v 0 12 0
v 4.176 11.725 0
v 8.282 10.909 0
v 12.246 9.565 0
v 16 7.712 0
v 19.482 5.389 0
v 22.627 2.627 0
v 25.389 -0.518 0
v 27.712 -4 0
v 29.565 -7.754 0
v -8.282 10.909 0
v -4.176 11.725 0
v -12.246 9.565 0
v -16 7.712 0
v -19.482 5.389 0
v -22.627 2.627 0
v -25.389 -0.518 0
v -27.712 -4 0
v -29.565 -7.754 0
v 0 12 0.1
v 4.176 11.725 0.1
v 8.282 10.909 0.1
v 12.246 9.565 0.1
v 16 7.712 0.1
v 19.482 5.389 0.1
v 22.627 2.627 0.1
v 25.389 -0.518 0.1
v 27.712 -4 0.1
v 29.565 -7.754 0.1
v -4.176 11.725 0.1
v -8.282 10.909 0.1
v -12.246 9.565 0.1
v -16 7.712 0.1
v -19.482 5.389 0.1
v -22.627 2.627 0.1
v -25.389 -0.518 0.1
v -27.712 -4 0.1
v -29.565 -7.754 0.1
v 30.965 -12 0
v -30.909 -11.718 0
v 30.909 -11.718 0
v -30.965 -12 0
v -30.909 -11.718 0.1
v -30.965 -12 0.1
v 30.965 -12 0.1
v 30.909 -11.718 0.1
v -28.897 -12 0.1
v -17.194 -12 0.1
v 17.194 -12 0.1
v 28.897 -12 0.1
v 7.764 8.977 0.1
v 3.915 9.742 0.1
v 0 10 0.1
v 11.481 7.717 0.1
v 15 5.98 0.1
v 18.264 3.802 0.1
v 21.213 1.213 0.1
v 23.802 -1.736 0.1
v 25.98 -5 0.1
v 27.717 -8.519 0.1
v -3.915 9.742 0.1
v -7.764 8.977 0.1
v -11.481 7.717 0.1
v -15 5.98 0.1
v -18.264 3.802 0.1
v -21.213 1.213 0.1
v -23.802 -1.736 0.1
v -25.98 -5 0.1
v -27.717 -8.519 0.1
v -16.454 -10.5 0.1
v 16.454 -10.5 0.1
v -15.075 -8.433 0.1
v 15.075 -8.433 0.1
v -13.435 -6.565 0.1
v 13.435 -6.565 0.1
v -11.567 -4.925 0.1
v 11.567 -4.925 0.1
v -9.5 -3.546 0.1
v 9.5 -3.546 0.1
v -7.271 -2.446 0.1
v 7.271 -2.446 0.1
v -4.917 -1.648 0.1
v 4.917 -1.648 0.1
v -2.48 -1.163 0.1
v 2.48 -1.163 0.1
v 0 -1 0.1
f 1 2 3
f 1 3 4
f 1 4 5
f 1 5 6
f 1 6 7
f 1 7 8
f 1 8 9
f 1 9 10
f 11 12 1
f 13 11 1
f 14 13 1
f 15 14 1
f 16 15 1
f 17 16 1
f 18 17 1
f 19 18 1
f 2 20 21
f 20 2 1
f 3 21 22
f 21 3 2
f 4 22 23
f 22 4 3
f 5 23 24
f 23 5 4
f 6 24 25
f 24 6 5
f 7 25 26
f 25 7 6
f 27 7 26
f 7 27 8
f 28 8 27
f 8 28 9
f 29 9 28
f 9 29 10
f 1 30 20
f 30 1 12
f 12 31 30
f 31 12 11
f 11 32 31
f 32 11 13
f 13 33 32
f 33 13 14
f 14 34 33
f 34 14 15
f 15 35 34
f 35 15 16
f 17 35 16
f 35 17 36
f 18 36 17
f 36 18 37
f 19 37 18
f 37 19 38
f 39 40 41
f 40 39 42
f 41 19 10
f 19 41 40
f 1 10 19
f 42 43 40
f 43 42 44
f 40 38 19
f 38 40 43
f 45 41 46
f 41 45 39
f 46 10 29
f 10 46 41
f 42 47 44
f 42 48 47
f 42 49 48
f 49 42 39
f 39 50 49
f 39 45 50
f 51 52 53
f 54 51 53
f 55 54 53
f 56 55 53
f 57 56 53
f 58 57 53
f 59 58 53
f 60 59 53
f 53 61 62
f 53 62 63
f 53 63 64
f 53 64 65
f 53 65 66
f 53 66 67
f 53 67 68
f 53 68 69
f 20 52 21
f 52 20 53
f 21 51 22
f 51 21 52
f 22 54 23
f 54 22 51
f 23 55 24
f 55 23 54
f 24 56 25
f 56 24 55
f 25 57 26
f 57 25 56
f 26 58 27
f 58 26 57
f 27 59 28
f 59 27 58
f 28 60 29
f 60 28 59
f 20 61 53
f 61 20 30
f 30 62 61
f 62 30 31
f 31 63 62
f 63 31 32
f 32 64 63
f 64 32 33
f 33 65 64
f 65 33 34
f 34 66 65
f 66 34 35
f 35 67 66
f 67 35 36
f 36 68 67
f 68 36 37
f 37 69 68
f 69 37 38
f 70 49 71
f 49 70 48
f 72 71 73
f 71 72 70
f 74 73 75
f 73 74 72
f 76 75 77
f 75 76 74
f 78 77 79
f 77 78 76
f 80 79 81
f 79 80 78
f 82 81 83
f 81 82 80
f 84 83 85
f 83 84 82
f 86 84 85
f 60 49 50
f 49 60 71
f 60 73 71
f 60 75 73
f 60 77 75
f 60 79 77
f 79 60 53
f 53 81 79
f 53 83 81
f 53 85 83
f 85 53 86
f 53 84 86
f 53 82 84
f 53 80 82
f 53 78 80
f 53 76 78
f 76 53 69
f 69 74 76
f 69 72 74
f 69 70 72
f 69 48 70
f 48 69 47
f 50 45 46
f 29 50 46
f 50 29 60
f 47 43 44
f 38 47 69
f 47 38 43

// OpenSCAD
// file: ../p/48/3-16ring15.scad
use <../../lib.scad>
function ldraw_lib__48__3_16ring15() = [
// 0 Hi-Res Ring 15 x 0.1875
// 0 Name: 48\3-16ring15.dat
// 0 Author: Massimo Maso [Sirio]
// 0 !LDRAW_ORG 48_Primitive UPDATE 2023-04
// 0 !LICENSE Licensed under CC BY 4.0 : see CAreadme.txt
// 
// 0 BFC CERTIFY CCW
  [0,"BFC","CERTIFY"],
  [0,"BFC","CCW"],
// 
// 0 !HISTORY 2023-08-25 [OrionP] Official Update 2023-04
// 
// 
// 4 16 16 0 0 15.8624 0 2.088 14.871 0 1.9575 15 0 0
  [4,16,16,0,0,15.8624,0,2.088,14.871,0,1.9575,15,0,0],
// 4 16 15.8624 0 2.088 15.4544 0 4.1408 14.4885 0 3.882 14.871 0 1.9575
  [4,16,15.8624,0,2.088,15.4544,0,4.1408,14.4885,0,3.882,14.871,0,1.9575],
// 4 16 15.4544 0 4.1408 14.7824 0 6.1232 13.8585 0 5.7405 14.4885 0 3.882
  [4,16,15.4544,0,4.1408,14.7824,0,6.1232,13.8585,0,5.7405,14.4885,0,3.882],
// 4 16 14.7824 0 6.1232 13.856 0 8 12.99 0 7.5 13.8585 0 5.7405
  [4,16,14.7824,0,6.1232,13.856,0,8,12.99,0,7.5,13.8585,0,5.7405],
// 4 16 13.856 0 8 12.6944 0 9.7408 11.901 0 9.132 12.99 0 7.5
  [4,16,13.856,0,8,12.6944,0,9.7408,11.901,0,9.132,12.99,0,7.5],
// 4 16 12.6944 0 9.7408 11.3136 0 11.3136 10.6065 0 10.6065 11.901 0 9.132
  [4,16,12.6944,0,9.7408,11.3136,0,11.3136,10.6065,0,10.6065,11.901,0,9.132],
// 4 16 11.3136 0 11.3136 9.7408 0 12.6944 9.132 0 11.901 10.6065 0 10.6065
  [4,16,11.3136,0,11.3136,9.7408,0,12.6944,9.132,0,11.901,10.6065,0,10.6065],
// 4 16 9.7408 0 12.6944 8 0 13.856 7.5 0 12.99 9.132 0 11.901
  [4,16,9.7408,0,12.6944,8,0,13.856,7.5,0,12.99,9.132,0,11.901],
// 4 16 8 0 13.856 6.1232 0 14.7824 5.7405 0 13.8585 7.5 0 12.99
  [4,16,8,0,13.856,6.1232,0,14.7824,5.7405,0,13.8585,7.5,0,12.99],
// 0 // Build by Primitive Generator 2
];
module ldraw_lib__48__3_16ring15(step=0, col=false, unit=2/5, alt=false, line=0.2, solid=!$preview)
    makepoly(ldraw_lib__48__3_16ring15(), step=step, col=col, unit=unit, alt=alt, line=line, solid=solid);
ldraw_lib__48__3_16ring15(line=0.2);
// file: ../p/48/3-16cyli.scad
use <../../lib.scad>
function ldraw_lib__48__3_16cyli() = [
// 0 Hi-Res Cylinder 0.1875
// 0 Name: 48\3-16cyli.dat
// 0 Author: Mark Kennedy [mkennedy]
// 0 !LDRAW_ORG 48_Primitive UPDATE 2012-02
// 0 !LICENSE Licensed under CC BY 4.0 : see CAreadme.txt
// 
// 0 BFC CERTIFY CCW
  [0,"BFC","CERTIFY"],
  [0,"BFC","CCW"],
// 
// 0 !HISTORY 2002-02-28 [hafhead] Added BFC statement
// 0 !HISTORY 2004-04-22 [PTadmin] Official Update 2004-02
// 0 !HISTORY 2007-06-24 [PTadmin] Header formatted for Contributor Agreement
// 0 !HISTORY 2008-07-01 [PTadmin] Official Update 2008-01
// 0 !HISTORY 2012-02-27 [Philo] Changed to CCW
// 0 !HISTORY 2012-08-09 [PTadmin] Official Update 2012-02
// 
// 
// 5 24 1 0 0 1 1 0 0.9914 0 0.1305 1 0 -1
  [5,24,1,0,0,1,1,0,0.9914,0,0.1305,1,0,-1],
// 5 24 0.9914 0 0.1305 0.9914 1 0.1305 0.9659 0 0.2588 1 0 0
  [5,24,0.9914,0,0.1305,0.9914,1,0.1305,0.9659,0,0.2588,1,0,0],
// 5 24 0.9659 0 0.2588 0.9659 1 0.2588 0.9239 0 0.3827 0.9914 0 0.1305
  [5,24,0.9659,0,0.2588,0.9659,1,0.2588,0.9239,0,0.3827,0.9914,0,0.1305],
// 5 24 0.9239 0 0.3827 0.9239 1 0.3827 0.866 0 0.5 0.9659 0 0.2588
  [5,24,0.9239,0,0.3827,0.9239,1,0.3827,0.866,0,0.5,0.9659,0,0.2588],
// 5 24 0.866 0 0.5 0.866 1 0.5 0.7934 0 0.6088 0.9239 0 0.3827
  [5,24,0.866,0,0.5,0.866,1,0.5,0.7934,0,0.6088,0.9239,0,0.3827],
// 5 24 0.7934 0 0.6088 0.7934 1 0.6088 0.7071 0 0.7071 0.866 0 0.5
  [5,24,0.7934,0,0.6088,0.7934,1,0.6088,0.7071,0,0.7071,0.866,0,0.5],
// 5 24 0.7071 0 0.7071 0.7071 1 0.7071 0.6088 0 0.7934 0.7934 0 0.6088
  [5,24,0.7071,0,0.7071,0.7071,1,0.7071,0.6088,0,0.7934,0.7934,0,0.6088],
// 5 24 0.6088 0 0.7934 0.6088 1 0.7934 0.5 0 0.866 0.7071 0 0.7071
  [5,24,0.6088,0,0.7934,0.6088,1,0.7934,0.5,0,0.866,0.7071,0,0.7071],
// 5 24 0.5 0 0.866 0.5 1 0.866 0.3827 0 0.9239 0.6088 0 0.7934
  [5,24,0.5,0,0.866,0.5,1,0.866,0.3827,0,0.9239,0.6088,0,0.7934],
// 5 24 0.3827 0 0.9239 0.3827 1 0.9239 0.2588 0 0.9659 0.5 0 0.866
  [5,24,0.3827,0,0.9239,0.3827,1,0.9239,0.2588,0,0.9659,0.5,0,0.866],
// 
// 4 16 1 1 0 0.9914 1 0.1305 0.9914 0 0.1305 1 0 0
  [4,16,1,1,0,0.9914,1,0.1305,0.9914,0,0.1305,1,0,0],
// 4 16 0.9914 1 0.1305 0.9659 1 0.2588 0.9659 0 0.2588 0.9914 0 0.1305
  [4,16,0.9914,1,0.1305,0.9659,1,0.2588,0.9659,0,0.2588,0.9914,0,0.1305],
// 4 16 0.9659 1 0.2588 0.9239 1 0.3827 0.9239 0 0.3827 0.9659 0 0.2588
  [4,16,0.9659,1,0.2588,0.9239,1,0.3827,0.9239,0,0.3827,0.9659,0,0.2588],
// 4 16 0.9239 1 0.3827 0.866 1 0.5 0.866 0 0.5 0.9239 0 0.3827
  [4,16,0.9239,1,0.3827,0.866,1,0.5,0.866,0,0.5,0.9239,0,0.3827],
// 4 16 0.866 1 0.5 0.7934 1 0.6088 0.7934 0 0.6088 0.866 0 0.5
  [4,16,0.866,1,0.5,0.7934,1,0.6088,0.7934,0,0.6088,0.866,0,0.5],
// 4 16 0.7934 1 0.6088 0.7071 1 0.7071 0.7071 0 0.7071 0.7934 0 0.6088
  [4,16,0.7934,1,0.6088,0.7071,1,0.7071,0.7071,0,0.7071,0.7934,0,0.6088],
// 4 16 0.7071 1 0.7071 0.6088 1 0.7934 0.6088 0 0.7934 0.7071 0 0.7071
  [4,16,0.7071,1,0.7071,0.6088,1,0.7934,0.6088,0,0.7934,0.7071,0,0.7071],
// 4 16 0.6088 1 0.7934 0.5 1 0.866 0.5 0 0.866 0.6088 0 0.7934
  [4,16,0.6088,1,0.7934,0.5,1,0.866,0.5,0,0.866,0.6088,0,0.7934],
// 4 16 0.5 1 0.866 0.3827 1 0.9239 0.3827 0 0.9239 0.5 0 0.866
  [4,16,0.5,1,0.866,0.3827,1,0.9239,0.3827,0,0.9239,0.5,0,0.866],
];
module ldraw_lib__48__3_16cyli(step=0, col=false, unit=2/5, alt=false, line=0.2, solid=!$preview)
    makepoly(ldraw_lib__48__3_16cyli(), step=step, col=col, unit=unit, alt=alt, line=line, solid=solid);
ldraw_lib__48__3_16cyli(line=0.2);
// file: ../p/48/3-16chrd.scad
use <../../lib.scad>
function ldraw_lib__48__3_16chrd() = [
// 0 Hi-Res Chord 0.1875
// 0 Name: 48\3-16chrd.dat
// 0 Author: Magnus Forsberg [MagFors]
// 0 !LDRAW_ORG 48_Primitive UPDATE 2011-02
// 0 !LICENSE Licensed under CC BY 4.0 : see CAreadme.txt
// 
// 0 BFC CERTIFY CCW
  [0,"BFC","CERTIFY"],
  [0,"BFC","CCW"],
// 
// 0 !HISTORY 2011-12-29 [PTadmin] Official Update 2011-02
// 
// 
// 3 16 1 0 0 0.9914 0 0.1305 0.9659 0 0.2588
  [3,16,1,0,0,0.9914,0,0.1305,0.9659,0,0.2588],
// 3 16 1 0 0 0.9659 0 0.2588 0.9239 0 0.3827
  [3,16,1,0,0,0.9659,0,0.2588,0.9239,0,0.3827],
// 3 16 1 0 0 0.9239 0 0.3827 0.866 0 0.5
  [3,16,1,0,0,0.9239,0,0.3827,0.866,0,0.5],
// 3 16 1 0 0 0.866 0 0.5 0.7934 0 0.6088
  [3,16,1,0,0,0.866,0,0.5,0.7934,0,0.6088],
// 3 16 1 0 0 0.7934 0 0.6088 0.7071 0 0.7071
  [3,16,1,0,0,0.7934,0,0.6088,0.7071,0,0.7071],
// 3 16 1 0 0 0.7071 0 0.7071 0.6088 0 0.7934
  [3,16,1,0,0,0.7071,0,0.7071,0.6088,0,0.7934],
// 3 16 1 0 0 0.6088 0 0.7934 0.5 0 0.866
  [3,16,1,0,0,0.6088,0,0.7934,0.5,0,0.866],
// 3 16 1 0 0 0.5 0 0.866 0.3827 0 0.9239
  [3,16,1,0,0,0.5,0,0.866,0.3827,0,0.9239],
// 0 // Build by Primitive Generator 2
];
module ldraw_lib__48__3_16chrd(step=0, col=false, unit=2/5, alt=false, line=0.2, solid=!$preview)
    makepoly(ldraw_lib__48__3_16chrd(), step=step, col=col, unit=unit, alt=alt, line=line, solid=solid);
ldraw_lib__48__3_16chrd(line=0.2);
// main file
use <../lib.scad>
use <../p/48/3-16chrd.scad>
use <../p/48/3-16cyli.scad>
use <../p/48/3-16ring15.scad>
function ldraw_lib__4162510g() = [
// 0 Sticker  3.0 x  8.0 Round with Red/White/Blue Concentric Rings - Secondary Part
// 0 Name: 4162510g.dat
// 0 Author: Massimo Maso [Sirio]
// 0 !LDRAW_ORG Part UPDATE 2023-04
// 0 !LICENSE Licensed under CC BY 4.0 : see CAreadme.txt
// 
// 0 BFC CERTIFY CCW
  [0,"BFC","CERTIFY"],
  [0,"BFC","CCW"],
// 
// 0 !KEYWORDS Biplane, Camel, Sculptures, Set 3451, Sopwith
// 
// 0 !HISTORY 2023-08-25 [OrionP] Official Update 2023-04
// 
// 
// 0 // Primitives
// 1 16 0 0 -50 0 0 80 0 -1 0 80 0 0 48\3-16chrd.dat
  [1,16,0,0,-50,0,0,80,0,-1,0,80,0,0, ldraw_lib__48__3_16chrd()],
// 1 16 0 0 -50 0 0 -80 0 -1 0 80 0 0 48\3-16chrd.dat
  [1,16,0,0,-50,0,0,-80,0,-1,0,80,0,0, ldraw_lib__48__3_16chrd()],
// 1 16 0 -.25 -50 0 0 80 0 .25 0 80 0 0 48\3-16cyli.dat
  [1,16,0,-.25,-50,0,0,80,0,.25,0,80,0,0, ldraw_lib__48__3_16cyli()],
// 1 16 0 -.25 -50 0 0 -80 0 .25 0 80 0 0 48\3-16cyli.dat
  [1,16,0,-.25,-50,0,0,-80,0,.25,0,80,0,0, ldraw_lib__48__3_16cyli()],
// 0 // Bottom face
// 4 16 77.272 0 -29.296 77.4119 0 -30 -77.4119 0 -30 -77.272 0 -29.296
  [4,16,77.272,0,-29.296,77.4119,0,-30,-77.4119,0,-30,-77.272,0,-29.296],
// 4 16 77.272 0 -29.296 -77.272 0 -29.296 -73.912 0 -19.384 73.912 0 -19.384
  [4,16,77.272,0,-29.296,-77.272,0,-29.296,-73.912,0,-19.384,73.912,0,-19.384],
// 3 16 0 0 30 73.912 0 -19.384 -73.912 0 -19.384
  [3,16,0,0,30,73.912,0,-19.384,-73.912,0,-19.384],
// 0 // Lateral face
// 4 16 -77.4119 0 -30 -77.4119 -.25 -30 -77.272 -.25 -29.296 -77.272 0 -29.296
  [4,16,-77.4119,0,-30,-77.4119,-.25,-30,-77.272,-.25,-29.296,-77.272,0,-29.296],
// 4 16 -77.272 0 -29.296 -77.272 -.25 -29.296 -73.912 -.25 -19.384 -73.912 0 -19.384
  [4,16,-77.272,0,-29.296,-77.272,-.25,-29.296,-73.912,-.25,-19.384,-73.912,0,-19.384],
// 4 16 77.272 -.25 -29.296 77.4119 -.25 -30 77.4119 0 -30 77.272 0 -29.296
  [4,16,77.272,-.25,-29.296,77.4119,-.25,-30,77.4119,0,-30,77.272,0,-29.296],
// 4 16 73.912 -.25 -19.384 77.272 -.25 -29.296 77.272 0 -29.296 73.912 0 -19.384
  [4,16,73.912,-.25,-19.384,77.272,-.25,-29.296,77.272,0,-29.296,73.912,0,-19.384],
// 3 16 -77.4119 0 -30 -72.2425 -.25 -30 -77.4119 -.25 -30
  [3,16,-77.4119,0,-30,-72.2425,-.25,-30,-77.4119,-.25,-30],
// 3 16 -77.4119 0 -30 -42.986 -.25 -30 -72.2425 -.25 -30
  [3,16,-77.4119,0,-30,-42.986,-.25,-30,-72.2425,-.25,-30],
// 4 16 -77.4119 0 -30 77.4119 0 -30 42.986 -.25 -30 -42.986 -.25 -30
  [4,16,-77.4119,0,-30,77.4119,0,-30,42.986,-.25,-30,-42.986,-.25,-30],
// 3 16 77.4119 0 -30 72.2425 -.25 -30 42.986 -.25 -30
  [3,16,77.4119,0,-30,72.2425,-.25,-30,42.986,-.25,-30],
// 3 16 77.4119 0 -30 77.4119 -.25 -30 72.2425 -.25 -30
  [3,16,77.4119,0,-30,77.4119,-.25,-30,72.2425,-.25,-30],
// 0 // Conditional edges
// 5 24 -77.272 0 -29.296 -77.272 -.25 -29.296 -77.4119 0 -30 -73.912 0 -19.384
  [5,24,-77.272,0,-29.296,-77.272,-.25,-29.296,-77.4119,0,-30,-73.912,0,-19.384],
// 5 24 -73.912 0 -19.384 -73.912 -.25 -19.384 -56.568 0 6.568 -77.272 0 -29.296
  [5,24,-73.912,0,-19.384,-73.912,-.25,-19.384,-56.568,0,6.568,-77.272,0,-29.296],
// 5 24 77.272 0 -29.296 77.272 -.25 -29.296 77.4119 0 -30 73.912 0 -19.384
  [5,24,77.272,0,-29.296,77.272,-.25,-29.296,77.4119,0,-30,73.912,0,-19.384],
// 5 24 73.912 0 -19.384 73.912 -.25 -19.384 56.568 0 6.568 77.272 0 -29.296
  [5,24,73.912,0,-19.384,73.912,-.25,-19.384,56.568,0,6.568,77.272,0,-29.296],
// 0 // Top faces
// 1 1 0 -.25 -50 0 0 75 0 1 0 75 0 0 48\3-16chrd.dat
  [1,1,0,-.25,-50,0,0,75,0,1,0,75,0,0, ldraw_lib__48__3_16chrd()],
// 1 1 0 -.25 -50 0 0 -75 0 1 0 75 0 0 48\3-16chrd.dat
  [1,1,0,-.25,-50,0,0,-75,0,1,0,75,0,0, ldraw_lib__48__3_16chrd()],
// 1 15 0 -.25 -50 0 0 5 0 1 0 5 0 0 48\3-16ring15.dat
  [1,15,0,-.25,-50,0,0,5,0,1,0,5,0,0, ldraw_lib__48__3_16ring15()],
// 1 15 0 -.25 -50 0 0 -5 0 1 0 5 0 0 48\3-16ring15.dat
  [1,15,0,-.25,-50,0,0,-5,0,1,0,5,0,0, ldraw_lib__48__3_16ring15()],
// 0 // Inner white faces
// 4 15 41.135 -.25 -26.25 -41.135 -.25 -26.25 -42.986 -.25 -30 42.986 -.25 -30
  [4,15,41.135,-.25,-26.25,-41.135,-.25,-26.25,-42.986,-.25,-30,42.986,-.25,-30],
// 4 15 41.135 -.25 -26.25 37.6865 -.25 -21.082 -37.6865 -.25 -21.082 -41.135 -.25 -26.25
  [4,15,41.135,-.25,-26.25,37.6865,-.25,-21.082,-37.6865,-.25,-21.082,-41.135,-.25,-26.25],
// 4 15 33.5873 -.25 -16.4128 -33.5873 -.25 -16.4128 -37.6865 -.25 -21.082 37.6865 -.25 -21.082
  [4,15,33.5873,-.25,-16.4128,-33.5873,-.25,-16.4128,-37.6865,-.25,-21.082,37.6865,-.25,-21.082],
// 4 15 33.5873 -.25 -16.4128 28.918 -.25 -12.3135 -28.918 -.25 -12.3135 -33.5873 -.25 -16.4128
  [4,15,33.5873,-.25,-16.4128,28.918,-.25,-12.3135,-28.918,-.25,-12.3135,-33.5873,-.25,-16.4128],
// 4 15 23.75 -.25 -8.865 -23.75 -.25 -8.865 -28.918 -.25 -12.3135 28.918 -.25 -12.3135
  [4,15,23.75,-.25,-8.865,-23.75,-.25,-8.865,-28.918,-.25,-12.3135,28.918,-.25,-12.3135],
// 4 15 23.75 -.25 -8.865 18.1783 -.25 -6.1148 -18.1783 -.25 -6.1148 -23.75 -.25 -8.865
  [4,15,23.75,-.25,-8.865,18.1783,-.25,-6.1148,-18.1783,-.25,-6.1148,-23.75,-.25,-8.865],
// 4 15 12.293 -.25 -4.1198 -12.293 -.25 -4.1198 -18.1783 -.25 -6.1148 18.1783 -.25 -6.1148
  [4,15,12.293,-.25,-4.1198,-12.293,-.25,-4.1198,-18.1783,-.25,-6.1148,18.1783,-.25,-6.1148],
// 4 15 12.293 -.25 -4.1198 6.1988 -.25 -2.9085 -6.1988 -.25 -2.9085 -12.293 -.25 -4.1198
  [4,15,12.293,-.25,-4.1198,6.1988,-.25,-2.9085,-6.1988,-.25,-2.9085,-12.293,-.25,-4.1198],
// 3 15 0 -.25 -2.5 -6.1988 -.25 -2.9085 6.1988 -.25 -2.9085
  [3,15,0,-.25,-2.5,-6.1988,-.25,-2.9085,6.1988,-.25,-2.9085],
// 0 // Blue faces
// 4 1 69.2925 -.25 -21.2975 41.135 -.25 -26.25 42.986 -.25 -30 72.2425 -.25 -30
  [4,1,69.2925,-.25,-21.2975,41.135,-.25,-26.25,42.986,-.25,-30,72.2425,-.25,-30],
// 3 1 69.2925 -.25 -21.2975 37.6865 -.25 -21.082 41.135 -.25 -26.25
  [3,1,69.2925,-.25,-21.2975,37.6865,-.25,-21.082,41.135,-.25,-26.25],
// 3 1 69.2925 -.25 -21.2975 33.5873 -.25 -16.4128 37.6865 -.25 -21.082
  [3,1,69.2925,-.25,-21.2975,33.5873,-.25,-16.4128,37.6865,-.25,-21.082],
// 3 1 69.2925 -.25 -21.2975 28.918 -.25 -12.3135 33.5873 -.25 -16.4128
  [3,1,69.2925,-.25,-21.2975,28.918,-.25,-12.3135,33.5873,-.25,-16.4128],
// 4 1 69.2925 -.25 -21.2975 0 -.25 25 23.75 -.25 -8.865 28.918 -.25 -12.3135
  [4,1,69.2925,-.25,-21.2975,0,-.25,25,23.75,-.25,-8.865,28.918,-.25,-12.3135],
// 3 1 0 -.25 25 18.1783 -.25 -6.1148 23.75 -.25 -8.865
  [3,1,0,-.25,25,18.1783,-.25,-6.1148,23.75,-.25,-8.865],
// 3 1 0 -.25 25 12.293 -.25 -4.1198 18.1783 -.25 -6.1148
  [3,1,0,-.25,25,12.293,-.25,-4.1198,18.1783,-.25,-6.1148],
// 3 1 0 -.25 25 6.1988 -.25 -2.9085 12.293 -.25 -4.1198
  [3,1,0,-.25,25,6.1988,-.25,-2.9085,12.293,-.25,-4.1198],
// 3 1 6.1988 -.25 -2.9085 0 -.25 25 0 -.25 -2.5
  [3,1,6.1988,-.25,-2.9085,0,-.25,25,0,-.25,-2.5],
// 3 1 0 -.25 25 -6.1988 -.25 -2.9085 0 -.25 -2.5
  [3,1,0,-.25,25,-6.1988,-.25,-2.9085,0,-.25,-2.5],
// 3 1 0 -.25 25 -12.293 -.25 -4.1198 -6.1988 -.25 -2.9085
  [3,1,0,-.25,25,-12.293,-.25,-4.1198,-6.1988,-.25,-2.9085],
// 3 1 0 -.25 25 -18.1783 -.25 -6.1148 -12.293 -.25 -4.1198
  [3,1,0,-.25,25,-18.1783,-.25,-6.1148,-12.293,-.25,-4.1198],
// 3 1 0 -.25 25 -23.75 -.25 -8.865 -18.1783 -.25 -6.1148
  [3,1,0,-.25,25,-23.75,-.25,-8.865,-18.1783,-.25,-6.1148],
// 4 1 -69.2925 -.25 -21.2975 -28.918 -.25 -12.3135 -23.75 -.25 -8.865 0 -.25 25
  [4,1,-69.2925,-.25,-21.2975,-28.918,-.25,-12.3135,-23.75,-.25,-8.865,0,-.25,25],
// 3 1 -69.2925 -.25 -21.2975 -33.5873 -.25 -16.4128 -28.918 -.25 -12.3135
  [3,1,-69.2925,-.25,-21.2975,-33.5873,-.25,-16.4128,-28.918,-.25,-12.3135],
// 3 1 -69.2925 -.25 -21.2975 -37.6865 -.25 -21.082 -33.5873 -.25 -16.4128
  [3,1,-69.2925,-.25,-21.2975,-37.6865,-.25,-21.082,-33.5873,-.25,-16.4128],
// 3 1 -69.2925 -.25 -21.2975 -41.135 -.25 -26.25 -37.6865 -.25 -21.082
  [3,1,-69.2925,-.25,-21.2975,-41.135,-.25,-26.25,-37.6865,-.25,-21.082],
// 4 1 -69.2925 -.25 -21.2975 -72.2425 -.25 -30 -42.986 -.25 -30 -41.135 -.25 -26.25
  [4,1,-69.2925,-.25,-21.2975,-72.2425,-.25,-30,-42.986,-.25,-30,-41.135,-.25,-26.25],
// 0 // Outer white faces
// 3 15 72.2425 -.25 -30 77.4119 -.25 -30 77.272 -.25 -29.296
  [3,15,72.2425,-.25,-30,77.4119,-.25,-30,77.272,-.25,-29.296],
// 4 15 72.2425 -.25 -30 77.272 -.25 -29.296 73.912 -.25 -19.384 69.2925 -.25 -21.2975
  [4,15,72.2425,-.25,-30,77.272,-.25,-29.296,73.912,-.25,-19.384,69.2925,-.25,-21.2975],
// 3 15 -72.2425 -.25 -30 -77.272 -.25 -29.296 -77.4119 -.25 -30
  [3,15,-72.2425,-.25,-30,-77.272,-.25,-29.296,-77.4119,-.25,-30],
// 4 15 -72.2425 -.25 -30 -69.2925 -.25 -21.2975 -73.912 -.25 -19.384 -77.272 -.25 -29.296
  [4,15,-72.2425,-.25,-30,-69.2925,-.25,-21.2975,-73.912,-.25,-19.384,-77.272,-.25,-29.296],
];
module ldraw_lib__4162510g(step=0, col=false, unit=2/5, alt=false, line=0.2, solid=!$preview)
    makepoly(ldraw_lib__4162510g(), step=step, col=col, unit=unit, alt=alt, line=line, solid=solid);
ldraw_lib__4162510g(line=0.2);
